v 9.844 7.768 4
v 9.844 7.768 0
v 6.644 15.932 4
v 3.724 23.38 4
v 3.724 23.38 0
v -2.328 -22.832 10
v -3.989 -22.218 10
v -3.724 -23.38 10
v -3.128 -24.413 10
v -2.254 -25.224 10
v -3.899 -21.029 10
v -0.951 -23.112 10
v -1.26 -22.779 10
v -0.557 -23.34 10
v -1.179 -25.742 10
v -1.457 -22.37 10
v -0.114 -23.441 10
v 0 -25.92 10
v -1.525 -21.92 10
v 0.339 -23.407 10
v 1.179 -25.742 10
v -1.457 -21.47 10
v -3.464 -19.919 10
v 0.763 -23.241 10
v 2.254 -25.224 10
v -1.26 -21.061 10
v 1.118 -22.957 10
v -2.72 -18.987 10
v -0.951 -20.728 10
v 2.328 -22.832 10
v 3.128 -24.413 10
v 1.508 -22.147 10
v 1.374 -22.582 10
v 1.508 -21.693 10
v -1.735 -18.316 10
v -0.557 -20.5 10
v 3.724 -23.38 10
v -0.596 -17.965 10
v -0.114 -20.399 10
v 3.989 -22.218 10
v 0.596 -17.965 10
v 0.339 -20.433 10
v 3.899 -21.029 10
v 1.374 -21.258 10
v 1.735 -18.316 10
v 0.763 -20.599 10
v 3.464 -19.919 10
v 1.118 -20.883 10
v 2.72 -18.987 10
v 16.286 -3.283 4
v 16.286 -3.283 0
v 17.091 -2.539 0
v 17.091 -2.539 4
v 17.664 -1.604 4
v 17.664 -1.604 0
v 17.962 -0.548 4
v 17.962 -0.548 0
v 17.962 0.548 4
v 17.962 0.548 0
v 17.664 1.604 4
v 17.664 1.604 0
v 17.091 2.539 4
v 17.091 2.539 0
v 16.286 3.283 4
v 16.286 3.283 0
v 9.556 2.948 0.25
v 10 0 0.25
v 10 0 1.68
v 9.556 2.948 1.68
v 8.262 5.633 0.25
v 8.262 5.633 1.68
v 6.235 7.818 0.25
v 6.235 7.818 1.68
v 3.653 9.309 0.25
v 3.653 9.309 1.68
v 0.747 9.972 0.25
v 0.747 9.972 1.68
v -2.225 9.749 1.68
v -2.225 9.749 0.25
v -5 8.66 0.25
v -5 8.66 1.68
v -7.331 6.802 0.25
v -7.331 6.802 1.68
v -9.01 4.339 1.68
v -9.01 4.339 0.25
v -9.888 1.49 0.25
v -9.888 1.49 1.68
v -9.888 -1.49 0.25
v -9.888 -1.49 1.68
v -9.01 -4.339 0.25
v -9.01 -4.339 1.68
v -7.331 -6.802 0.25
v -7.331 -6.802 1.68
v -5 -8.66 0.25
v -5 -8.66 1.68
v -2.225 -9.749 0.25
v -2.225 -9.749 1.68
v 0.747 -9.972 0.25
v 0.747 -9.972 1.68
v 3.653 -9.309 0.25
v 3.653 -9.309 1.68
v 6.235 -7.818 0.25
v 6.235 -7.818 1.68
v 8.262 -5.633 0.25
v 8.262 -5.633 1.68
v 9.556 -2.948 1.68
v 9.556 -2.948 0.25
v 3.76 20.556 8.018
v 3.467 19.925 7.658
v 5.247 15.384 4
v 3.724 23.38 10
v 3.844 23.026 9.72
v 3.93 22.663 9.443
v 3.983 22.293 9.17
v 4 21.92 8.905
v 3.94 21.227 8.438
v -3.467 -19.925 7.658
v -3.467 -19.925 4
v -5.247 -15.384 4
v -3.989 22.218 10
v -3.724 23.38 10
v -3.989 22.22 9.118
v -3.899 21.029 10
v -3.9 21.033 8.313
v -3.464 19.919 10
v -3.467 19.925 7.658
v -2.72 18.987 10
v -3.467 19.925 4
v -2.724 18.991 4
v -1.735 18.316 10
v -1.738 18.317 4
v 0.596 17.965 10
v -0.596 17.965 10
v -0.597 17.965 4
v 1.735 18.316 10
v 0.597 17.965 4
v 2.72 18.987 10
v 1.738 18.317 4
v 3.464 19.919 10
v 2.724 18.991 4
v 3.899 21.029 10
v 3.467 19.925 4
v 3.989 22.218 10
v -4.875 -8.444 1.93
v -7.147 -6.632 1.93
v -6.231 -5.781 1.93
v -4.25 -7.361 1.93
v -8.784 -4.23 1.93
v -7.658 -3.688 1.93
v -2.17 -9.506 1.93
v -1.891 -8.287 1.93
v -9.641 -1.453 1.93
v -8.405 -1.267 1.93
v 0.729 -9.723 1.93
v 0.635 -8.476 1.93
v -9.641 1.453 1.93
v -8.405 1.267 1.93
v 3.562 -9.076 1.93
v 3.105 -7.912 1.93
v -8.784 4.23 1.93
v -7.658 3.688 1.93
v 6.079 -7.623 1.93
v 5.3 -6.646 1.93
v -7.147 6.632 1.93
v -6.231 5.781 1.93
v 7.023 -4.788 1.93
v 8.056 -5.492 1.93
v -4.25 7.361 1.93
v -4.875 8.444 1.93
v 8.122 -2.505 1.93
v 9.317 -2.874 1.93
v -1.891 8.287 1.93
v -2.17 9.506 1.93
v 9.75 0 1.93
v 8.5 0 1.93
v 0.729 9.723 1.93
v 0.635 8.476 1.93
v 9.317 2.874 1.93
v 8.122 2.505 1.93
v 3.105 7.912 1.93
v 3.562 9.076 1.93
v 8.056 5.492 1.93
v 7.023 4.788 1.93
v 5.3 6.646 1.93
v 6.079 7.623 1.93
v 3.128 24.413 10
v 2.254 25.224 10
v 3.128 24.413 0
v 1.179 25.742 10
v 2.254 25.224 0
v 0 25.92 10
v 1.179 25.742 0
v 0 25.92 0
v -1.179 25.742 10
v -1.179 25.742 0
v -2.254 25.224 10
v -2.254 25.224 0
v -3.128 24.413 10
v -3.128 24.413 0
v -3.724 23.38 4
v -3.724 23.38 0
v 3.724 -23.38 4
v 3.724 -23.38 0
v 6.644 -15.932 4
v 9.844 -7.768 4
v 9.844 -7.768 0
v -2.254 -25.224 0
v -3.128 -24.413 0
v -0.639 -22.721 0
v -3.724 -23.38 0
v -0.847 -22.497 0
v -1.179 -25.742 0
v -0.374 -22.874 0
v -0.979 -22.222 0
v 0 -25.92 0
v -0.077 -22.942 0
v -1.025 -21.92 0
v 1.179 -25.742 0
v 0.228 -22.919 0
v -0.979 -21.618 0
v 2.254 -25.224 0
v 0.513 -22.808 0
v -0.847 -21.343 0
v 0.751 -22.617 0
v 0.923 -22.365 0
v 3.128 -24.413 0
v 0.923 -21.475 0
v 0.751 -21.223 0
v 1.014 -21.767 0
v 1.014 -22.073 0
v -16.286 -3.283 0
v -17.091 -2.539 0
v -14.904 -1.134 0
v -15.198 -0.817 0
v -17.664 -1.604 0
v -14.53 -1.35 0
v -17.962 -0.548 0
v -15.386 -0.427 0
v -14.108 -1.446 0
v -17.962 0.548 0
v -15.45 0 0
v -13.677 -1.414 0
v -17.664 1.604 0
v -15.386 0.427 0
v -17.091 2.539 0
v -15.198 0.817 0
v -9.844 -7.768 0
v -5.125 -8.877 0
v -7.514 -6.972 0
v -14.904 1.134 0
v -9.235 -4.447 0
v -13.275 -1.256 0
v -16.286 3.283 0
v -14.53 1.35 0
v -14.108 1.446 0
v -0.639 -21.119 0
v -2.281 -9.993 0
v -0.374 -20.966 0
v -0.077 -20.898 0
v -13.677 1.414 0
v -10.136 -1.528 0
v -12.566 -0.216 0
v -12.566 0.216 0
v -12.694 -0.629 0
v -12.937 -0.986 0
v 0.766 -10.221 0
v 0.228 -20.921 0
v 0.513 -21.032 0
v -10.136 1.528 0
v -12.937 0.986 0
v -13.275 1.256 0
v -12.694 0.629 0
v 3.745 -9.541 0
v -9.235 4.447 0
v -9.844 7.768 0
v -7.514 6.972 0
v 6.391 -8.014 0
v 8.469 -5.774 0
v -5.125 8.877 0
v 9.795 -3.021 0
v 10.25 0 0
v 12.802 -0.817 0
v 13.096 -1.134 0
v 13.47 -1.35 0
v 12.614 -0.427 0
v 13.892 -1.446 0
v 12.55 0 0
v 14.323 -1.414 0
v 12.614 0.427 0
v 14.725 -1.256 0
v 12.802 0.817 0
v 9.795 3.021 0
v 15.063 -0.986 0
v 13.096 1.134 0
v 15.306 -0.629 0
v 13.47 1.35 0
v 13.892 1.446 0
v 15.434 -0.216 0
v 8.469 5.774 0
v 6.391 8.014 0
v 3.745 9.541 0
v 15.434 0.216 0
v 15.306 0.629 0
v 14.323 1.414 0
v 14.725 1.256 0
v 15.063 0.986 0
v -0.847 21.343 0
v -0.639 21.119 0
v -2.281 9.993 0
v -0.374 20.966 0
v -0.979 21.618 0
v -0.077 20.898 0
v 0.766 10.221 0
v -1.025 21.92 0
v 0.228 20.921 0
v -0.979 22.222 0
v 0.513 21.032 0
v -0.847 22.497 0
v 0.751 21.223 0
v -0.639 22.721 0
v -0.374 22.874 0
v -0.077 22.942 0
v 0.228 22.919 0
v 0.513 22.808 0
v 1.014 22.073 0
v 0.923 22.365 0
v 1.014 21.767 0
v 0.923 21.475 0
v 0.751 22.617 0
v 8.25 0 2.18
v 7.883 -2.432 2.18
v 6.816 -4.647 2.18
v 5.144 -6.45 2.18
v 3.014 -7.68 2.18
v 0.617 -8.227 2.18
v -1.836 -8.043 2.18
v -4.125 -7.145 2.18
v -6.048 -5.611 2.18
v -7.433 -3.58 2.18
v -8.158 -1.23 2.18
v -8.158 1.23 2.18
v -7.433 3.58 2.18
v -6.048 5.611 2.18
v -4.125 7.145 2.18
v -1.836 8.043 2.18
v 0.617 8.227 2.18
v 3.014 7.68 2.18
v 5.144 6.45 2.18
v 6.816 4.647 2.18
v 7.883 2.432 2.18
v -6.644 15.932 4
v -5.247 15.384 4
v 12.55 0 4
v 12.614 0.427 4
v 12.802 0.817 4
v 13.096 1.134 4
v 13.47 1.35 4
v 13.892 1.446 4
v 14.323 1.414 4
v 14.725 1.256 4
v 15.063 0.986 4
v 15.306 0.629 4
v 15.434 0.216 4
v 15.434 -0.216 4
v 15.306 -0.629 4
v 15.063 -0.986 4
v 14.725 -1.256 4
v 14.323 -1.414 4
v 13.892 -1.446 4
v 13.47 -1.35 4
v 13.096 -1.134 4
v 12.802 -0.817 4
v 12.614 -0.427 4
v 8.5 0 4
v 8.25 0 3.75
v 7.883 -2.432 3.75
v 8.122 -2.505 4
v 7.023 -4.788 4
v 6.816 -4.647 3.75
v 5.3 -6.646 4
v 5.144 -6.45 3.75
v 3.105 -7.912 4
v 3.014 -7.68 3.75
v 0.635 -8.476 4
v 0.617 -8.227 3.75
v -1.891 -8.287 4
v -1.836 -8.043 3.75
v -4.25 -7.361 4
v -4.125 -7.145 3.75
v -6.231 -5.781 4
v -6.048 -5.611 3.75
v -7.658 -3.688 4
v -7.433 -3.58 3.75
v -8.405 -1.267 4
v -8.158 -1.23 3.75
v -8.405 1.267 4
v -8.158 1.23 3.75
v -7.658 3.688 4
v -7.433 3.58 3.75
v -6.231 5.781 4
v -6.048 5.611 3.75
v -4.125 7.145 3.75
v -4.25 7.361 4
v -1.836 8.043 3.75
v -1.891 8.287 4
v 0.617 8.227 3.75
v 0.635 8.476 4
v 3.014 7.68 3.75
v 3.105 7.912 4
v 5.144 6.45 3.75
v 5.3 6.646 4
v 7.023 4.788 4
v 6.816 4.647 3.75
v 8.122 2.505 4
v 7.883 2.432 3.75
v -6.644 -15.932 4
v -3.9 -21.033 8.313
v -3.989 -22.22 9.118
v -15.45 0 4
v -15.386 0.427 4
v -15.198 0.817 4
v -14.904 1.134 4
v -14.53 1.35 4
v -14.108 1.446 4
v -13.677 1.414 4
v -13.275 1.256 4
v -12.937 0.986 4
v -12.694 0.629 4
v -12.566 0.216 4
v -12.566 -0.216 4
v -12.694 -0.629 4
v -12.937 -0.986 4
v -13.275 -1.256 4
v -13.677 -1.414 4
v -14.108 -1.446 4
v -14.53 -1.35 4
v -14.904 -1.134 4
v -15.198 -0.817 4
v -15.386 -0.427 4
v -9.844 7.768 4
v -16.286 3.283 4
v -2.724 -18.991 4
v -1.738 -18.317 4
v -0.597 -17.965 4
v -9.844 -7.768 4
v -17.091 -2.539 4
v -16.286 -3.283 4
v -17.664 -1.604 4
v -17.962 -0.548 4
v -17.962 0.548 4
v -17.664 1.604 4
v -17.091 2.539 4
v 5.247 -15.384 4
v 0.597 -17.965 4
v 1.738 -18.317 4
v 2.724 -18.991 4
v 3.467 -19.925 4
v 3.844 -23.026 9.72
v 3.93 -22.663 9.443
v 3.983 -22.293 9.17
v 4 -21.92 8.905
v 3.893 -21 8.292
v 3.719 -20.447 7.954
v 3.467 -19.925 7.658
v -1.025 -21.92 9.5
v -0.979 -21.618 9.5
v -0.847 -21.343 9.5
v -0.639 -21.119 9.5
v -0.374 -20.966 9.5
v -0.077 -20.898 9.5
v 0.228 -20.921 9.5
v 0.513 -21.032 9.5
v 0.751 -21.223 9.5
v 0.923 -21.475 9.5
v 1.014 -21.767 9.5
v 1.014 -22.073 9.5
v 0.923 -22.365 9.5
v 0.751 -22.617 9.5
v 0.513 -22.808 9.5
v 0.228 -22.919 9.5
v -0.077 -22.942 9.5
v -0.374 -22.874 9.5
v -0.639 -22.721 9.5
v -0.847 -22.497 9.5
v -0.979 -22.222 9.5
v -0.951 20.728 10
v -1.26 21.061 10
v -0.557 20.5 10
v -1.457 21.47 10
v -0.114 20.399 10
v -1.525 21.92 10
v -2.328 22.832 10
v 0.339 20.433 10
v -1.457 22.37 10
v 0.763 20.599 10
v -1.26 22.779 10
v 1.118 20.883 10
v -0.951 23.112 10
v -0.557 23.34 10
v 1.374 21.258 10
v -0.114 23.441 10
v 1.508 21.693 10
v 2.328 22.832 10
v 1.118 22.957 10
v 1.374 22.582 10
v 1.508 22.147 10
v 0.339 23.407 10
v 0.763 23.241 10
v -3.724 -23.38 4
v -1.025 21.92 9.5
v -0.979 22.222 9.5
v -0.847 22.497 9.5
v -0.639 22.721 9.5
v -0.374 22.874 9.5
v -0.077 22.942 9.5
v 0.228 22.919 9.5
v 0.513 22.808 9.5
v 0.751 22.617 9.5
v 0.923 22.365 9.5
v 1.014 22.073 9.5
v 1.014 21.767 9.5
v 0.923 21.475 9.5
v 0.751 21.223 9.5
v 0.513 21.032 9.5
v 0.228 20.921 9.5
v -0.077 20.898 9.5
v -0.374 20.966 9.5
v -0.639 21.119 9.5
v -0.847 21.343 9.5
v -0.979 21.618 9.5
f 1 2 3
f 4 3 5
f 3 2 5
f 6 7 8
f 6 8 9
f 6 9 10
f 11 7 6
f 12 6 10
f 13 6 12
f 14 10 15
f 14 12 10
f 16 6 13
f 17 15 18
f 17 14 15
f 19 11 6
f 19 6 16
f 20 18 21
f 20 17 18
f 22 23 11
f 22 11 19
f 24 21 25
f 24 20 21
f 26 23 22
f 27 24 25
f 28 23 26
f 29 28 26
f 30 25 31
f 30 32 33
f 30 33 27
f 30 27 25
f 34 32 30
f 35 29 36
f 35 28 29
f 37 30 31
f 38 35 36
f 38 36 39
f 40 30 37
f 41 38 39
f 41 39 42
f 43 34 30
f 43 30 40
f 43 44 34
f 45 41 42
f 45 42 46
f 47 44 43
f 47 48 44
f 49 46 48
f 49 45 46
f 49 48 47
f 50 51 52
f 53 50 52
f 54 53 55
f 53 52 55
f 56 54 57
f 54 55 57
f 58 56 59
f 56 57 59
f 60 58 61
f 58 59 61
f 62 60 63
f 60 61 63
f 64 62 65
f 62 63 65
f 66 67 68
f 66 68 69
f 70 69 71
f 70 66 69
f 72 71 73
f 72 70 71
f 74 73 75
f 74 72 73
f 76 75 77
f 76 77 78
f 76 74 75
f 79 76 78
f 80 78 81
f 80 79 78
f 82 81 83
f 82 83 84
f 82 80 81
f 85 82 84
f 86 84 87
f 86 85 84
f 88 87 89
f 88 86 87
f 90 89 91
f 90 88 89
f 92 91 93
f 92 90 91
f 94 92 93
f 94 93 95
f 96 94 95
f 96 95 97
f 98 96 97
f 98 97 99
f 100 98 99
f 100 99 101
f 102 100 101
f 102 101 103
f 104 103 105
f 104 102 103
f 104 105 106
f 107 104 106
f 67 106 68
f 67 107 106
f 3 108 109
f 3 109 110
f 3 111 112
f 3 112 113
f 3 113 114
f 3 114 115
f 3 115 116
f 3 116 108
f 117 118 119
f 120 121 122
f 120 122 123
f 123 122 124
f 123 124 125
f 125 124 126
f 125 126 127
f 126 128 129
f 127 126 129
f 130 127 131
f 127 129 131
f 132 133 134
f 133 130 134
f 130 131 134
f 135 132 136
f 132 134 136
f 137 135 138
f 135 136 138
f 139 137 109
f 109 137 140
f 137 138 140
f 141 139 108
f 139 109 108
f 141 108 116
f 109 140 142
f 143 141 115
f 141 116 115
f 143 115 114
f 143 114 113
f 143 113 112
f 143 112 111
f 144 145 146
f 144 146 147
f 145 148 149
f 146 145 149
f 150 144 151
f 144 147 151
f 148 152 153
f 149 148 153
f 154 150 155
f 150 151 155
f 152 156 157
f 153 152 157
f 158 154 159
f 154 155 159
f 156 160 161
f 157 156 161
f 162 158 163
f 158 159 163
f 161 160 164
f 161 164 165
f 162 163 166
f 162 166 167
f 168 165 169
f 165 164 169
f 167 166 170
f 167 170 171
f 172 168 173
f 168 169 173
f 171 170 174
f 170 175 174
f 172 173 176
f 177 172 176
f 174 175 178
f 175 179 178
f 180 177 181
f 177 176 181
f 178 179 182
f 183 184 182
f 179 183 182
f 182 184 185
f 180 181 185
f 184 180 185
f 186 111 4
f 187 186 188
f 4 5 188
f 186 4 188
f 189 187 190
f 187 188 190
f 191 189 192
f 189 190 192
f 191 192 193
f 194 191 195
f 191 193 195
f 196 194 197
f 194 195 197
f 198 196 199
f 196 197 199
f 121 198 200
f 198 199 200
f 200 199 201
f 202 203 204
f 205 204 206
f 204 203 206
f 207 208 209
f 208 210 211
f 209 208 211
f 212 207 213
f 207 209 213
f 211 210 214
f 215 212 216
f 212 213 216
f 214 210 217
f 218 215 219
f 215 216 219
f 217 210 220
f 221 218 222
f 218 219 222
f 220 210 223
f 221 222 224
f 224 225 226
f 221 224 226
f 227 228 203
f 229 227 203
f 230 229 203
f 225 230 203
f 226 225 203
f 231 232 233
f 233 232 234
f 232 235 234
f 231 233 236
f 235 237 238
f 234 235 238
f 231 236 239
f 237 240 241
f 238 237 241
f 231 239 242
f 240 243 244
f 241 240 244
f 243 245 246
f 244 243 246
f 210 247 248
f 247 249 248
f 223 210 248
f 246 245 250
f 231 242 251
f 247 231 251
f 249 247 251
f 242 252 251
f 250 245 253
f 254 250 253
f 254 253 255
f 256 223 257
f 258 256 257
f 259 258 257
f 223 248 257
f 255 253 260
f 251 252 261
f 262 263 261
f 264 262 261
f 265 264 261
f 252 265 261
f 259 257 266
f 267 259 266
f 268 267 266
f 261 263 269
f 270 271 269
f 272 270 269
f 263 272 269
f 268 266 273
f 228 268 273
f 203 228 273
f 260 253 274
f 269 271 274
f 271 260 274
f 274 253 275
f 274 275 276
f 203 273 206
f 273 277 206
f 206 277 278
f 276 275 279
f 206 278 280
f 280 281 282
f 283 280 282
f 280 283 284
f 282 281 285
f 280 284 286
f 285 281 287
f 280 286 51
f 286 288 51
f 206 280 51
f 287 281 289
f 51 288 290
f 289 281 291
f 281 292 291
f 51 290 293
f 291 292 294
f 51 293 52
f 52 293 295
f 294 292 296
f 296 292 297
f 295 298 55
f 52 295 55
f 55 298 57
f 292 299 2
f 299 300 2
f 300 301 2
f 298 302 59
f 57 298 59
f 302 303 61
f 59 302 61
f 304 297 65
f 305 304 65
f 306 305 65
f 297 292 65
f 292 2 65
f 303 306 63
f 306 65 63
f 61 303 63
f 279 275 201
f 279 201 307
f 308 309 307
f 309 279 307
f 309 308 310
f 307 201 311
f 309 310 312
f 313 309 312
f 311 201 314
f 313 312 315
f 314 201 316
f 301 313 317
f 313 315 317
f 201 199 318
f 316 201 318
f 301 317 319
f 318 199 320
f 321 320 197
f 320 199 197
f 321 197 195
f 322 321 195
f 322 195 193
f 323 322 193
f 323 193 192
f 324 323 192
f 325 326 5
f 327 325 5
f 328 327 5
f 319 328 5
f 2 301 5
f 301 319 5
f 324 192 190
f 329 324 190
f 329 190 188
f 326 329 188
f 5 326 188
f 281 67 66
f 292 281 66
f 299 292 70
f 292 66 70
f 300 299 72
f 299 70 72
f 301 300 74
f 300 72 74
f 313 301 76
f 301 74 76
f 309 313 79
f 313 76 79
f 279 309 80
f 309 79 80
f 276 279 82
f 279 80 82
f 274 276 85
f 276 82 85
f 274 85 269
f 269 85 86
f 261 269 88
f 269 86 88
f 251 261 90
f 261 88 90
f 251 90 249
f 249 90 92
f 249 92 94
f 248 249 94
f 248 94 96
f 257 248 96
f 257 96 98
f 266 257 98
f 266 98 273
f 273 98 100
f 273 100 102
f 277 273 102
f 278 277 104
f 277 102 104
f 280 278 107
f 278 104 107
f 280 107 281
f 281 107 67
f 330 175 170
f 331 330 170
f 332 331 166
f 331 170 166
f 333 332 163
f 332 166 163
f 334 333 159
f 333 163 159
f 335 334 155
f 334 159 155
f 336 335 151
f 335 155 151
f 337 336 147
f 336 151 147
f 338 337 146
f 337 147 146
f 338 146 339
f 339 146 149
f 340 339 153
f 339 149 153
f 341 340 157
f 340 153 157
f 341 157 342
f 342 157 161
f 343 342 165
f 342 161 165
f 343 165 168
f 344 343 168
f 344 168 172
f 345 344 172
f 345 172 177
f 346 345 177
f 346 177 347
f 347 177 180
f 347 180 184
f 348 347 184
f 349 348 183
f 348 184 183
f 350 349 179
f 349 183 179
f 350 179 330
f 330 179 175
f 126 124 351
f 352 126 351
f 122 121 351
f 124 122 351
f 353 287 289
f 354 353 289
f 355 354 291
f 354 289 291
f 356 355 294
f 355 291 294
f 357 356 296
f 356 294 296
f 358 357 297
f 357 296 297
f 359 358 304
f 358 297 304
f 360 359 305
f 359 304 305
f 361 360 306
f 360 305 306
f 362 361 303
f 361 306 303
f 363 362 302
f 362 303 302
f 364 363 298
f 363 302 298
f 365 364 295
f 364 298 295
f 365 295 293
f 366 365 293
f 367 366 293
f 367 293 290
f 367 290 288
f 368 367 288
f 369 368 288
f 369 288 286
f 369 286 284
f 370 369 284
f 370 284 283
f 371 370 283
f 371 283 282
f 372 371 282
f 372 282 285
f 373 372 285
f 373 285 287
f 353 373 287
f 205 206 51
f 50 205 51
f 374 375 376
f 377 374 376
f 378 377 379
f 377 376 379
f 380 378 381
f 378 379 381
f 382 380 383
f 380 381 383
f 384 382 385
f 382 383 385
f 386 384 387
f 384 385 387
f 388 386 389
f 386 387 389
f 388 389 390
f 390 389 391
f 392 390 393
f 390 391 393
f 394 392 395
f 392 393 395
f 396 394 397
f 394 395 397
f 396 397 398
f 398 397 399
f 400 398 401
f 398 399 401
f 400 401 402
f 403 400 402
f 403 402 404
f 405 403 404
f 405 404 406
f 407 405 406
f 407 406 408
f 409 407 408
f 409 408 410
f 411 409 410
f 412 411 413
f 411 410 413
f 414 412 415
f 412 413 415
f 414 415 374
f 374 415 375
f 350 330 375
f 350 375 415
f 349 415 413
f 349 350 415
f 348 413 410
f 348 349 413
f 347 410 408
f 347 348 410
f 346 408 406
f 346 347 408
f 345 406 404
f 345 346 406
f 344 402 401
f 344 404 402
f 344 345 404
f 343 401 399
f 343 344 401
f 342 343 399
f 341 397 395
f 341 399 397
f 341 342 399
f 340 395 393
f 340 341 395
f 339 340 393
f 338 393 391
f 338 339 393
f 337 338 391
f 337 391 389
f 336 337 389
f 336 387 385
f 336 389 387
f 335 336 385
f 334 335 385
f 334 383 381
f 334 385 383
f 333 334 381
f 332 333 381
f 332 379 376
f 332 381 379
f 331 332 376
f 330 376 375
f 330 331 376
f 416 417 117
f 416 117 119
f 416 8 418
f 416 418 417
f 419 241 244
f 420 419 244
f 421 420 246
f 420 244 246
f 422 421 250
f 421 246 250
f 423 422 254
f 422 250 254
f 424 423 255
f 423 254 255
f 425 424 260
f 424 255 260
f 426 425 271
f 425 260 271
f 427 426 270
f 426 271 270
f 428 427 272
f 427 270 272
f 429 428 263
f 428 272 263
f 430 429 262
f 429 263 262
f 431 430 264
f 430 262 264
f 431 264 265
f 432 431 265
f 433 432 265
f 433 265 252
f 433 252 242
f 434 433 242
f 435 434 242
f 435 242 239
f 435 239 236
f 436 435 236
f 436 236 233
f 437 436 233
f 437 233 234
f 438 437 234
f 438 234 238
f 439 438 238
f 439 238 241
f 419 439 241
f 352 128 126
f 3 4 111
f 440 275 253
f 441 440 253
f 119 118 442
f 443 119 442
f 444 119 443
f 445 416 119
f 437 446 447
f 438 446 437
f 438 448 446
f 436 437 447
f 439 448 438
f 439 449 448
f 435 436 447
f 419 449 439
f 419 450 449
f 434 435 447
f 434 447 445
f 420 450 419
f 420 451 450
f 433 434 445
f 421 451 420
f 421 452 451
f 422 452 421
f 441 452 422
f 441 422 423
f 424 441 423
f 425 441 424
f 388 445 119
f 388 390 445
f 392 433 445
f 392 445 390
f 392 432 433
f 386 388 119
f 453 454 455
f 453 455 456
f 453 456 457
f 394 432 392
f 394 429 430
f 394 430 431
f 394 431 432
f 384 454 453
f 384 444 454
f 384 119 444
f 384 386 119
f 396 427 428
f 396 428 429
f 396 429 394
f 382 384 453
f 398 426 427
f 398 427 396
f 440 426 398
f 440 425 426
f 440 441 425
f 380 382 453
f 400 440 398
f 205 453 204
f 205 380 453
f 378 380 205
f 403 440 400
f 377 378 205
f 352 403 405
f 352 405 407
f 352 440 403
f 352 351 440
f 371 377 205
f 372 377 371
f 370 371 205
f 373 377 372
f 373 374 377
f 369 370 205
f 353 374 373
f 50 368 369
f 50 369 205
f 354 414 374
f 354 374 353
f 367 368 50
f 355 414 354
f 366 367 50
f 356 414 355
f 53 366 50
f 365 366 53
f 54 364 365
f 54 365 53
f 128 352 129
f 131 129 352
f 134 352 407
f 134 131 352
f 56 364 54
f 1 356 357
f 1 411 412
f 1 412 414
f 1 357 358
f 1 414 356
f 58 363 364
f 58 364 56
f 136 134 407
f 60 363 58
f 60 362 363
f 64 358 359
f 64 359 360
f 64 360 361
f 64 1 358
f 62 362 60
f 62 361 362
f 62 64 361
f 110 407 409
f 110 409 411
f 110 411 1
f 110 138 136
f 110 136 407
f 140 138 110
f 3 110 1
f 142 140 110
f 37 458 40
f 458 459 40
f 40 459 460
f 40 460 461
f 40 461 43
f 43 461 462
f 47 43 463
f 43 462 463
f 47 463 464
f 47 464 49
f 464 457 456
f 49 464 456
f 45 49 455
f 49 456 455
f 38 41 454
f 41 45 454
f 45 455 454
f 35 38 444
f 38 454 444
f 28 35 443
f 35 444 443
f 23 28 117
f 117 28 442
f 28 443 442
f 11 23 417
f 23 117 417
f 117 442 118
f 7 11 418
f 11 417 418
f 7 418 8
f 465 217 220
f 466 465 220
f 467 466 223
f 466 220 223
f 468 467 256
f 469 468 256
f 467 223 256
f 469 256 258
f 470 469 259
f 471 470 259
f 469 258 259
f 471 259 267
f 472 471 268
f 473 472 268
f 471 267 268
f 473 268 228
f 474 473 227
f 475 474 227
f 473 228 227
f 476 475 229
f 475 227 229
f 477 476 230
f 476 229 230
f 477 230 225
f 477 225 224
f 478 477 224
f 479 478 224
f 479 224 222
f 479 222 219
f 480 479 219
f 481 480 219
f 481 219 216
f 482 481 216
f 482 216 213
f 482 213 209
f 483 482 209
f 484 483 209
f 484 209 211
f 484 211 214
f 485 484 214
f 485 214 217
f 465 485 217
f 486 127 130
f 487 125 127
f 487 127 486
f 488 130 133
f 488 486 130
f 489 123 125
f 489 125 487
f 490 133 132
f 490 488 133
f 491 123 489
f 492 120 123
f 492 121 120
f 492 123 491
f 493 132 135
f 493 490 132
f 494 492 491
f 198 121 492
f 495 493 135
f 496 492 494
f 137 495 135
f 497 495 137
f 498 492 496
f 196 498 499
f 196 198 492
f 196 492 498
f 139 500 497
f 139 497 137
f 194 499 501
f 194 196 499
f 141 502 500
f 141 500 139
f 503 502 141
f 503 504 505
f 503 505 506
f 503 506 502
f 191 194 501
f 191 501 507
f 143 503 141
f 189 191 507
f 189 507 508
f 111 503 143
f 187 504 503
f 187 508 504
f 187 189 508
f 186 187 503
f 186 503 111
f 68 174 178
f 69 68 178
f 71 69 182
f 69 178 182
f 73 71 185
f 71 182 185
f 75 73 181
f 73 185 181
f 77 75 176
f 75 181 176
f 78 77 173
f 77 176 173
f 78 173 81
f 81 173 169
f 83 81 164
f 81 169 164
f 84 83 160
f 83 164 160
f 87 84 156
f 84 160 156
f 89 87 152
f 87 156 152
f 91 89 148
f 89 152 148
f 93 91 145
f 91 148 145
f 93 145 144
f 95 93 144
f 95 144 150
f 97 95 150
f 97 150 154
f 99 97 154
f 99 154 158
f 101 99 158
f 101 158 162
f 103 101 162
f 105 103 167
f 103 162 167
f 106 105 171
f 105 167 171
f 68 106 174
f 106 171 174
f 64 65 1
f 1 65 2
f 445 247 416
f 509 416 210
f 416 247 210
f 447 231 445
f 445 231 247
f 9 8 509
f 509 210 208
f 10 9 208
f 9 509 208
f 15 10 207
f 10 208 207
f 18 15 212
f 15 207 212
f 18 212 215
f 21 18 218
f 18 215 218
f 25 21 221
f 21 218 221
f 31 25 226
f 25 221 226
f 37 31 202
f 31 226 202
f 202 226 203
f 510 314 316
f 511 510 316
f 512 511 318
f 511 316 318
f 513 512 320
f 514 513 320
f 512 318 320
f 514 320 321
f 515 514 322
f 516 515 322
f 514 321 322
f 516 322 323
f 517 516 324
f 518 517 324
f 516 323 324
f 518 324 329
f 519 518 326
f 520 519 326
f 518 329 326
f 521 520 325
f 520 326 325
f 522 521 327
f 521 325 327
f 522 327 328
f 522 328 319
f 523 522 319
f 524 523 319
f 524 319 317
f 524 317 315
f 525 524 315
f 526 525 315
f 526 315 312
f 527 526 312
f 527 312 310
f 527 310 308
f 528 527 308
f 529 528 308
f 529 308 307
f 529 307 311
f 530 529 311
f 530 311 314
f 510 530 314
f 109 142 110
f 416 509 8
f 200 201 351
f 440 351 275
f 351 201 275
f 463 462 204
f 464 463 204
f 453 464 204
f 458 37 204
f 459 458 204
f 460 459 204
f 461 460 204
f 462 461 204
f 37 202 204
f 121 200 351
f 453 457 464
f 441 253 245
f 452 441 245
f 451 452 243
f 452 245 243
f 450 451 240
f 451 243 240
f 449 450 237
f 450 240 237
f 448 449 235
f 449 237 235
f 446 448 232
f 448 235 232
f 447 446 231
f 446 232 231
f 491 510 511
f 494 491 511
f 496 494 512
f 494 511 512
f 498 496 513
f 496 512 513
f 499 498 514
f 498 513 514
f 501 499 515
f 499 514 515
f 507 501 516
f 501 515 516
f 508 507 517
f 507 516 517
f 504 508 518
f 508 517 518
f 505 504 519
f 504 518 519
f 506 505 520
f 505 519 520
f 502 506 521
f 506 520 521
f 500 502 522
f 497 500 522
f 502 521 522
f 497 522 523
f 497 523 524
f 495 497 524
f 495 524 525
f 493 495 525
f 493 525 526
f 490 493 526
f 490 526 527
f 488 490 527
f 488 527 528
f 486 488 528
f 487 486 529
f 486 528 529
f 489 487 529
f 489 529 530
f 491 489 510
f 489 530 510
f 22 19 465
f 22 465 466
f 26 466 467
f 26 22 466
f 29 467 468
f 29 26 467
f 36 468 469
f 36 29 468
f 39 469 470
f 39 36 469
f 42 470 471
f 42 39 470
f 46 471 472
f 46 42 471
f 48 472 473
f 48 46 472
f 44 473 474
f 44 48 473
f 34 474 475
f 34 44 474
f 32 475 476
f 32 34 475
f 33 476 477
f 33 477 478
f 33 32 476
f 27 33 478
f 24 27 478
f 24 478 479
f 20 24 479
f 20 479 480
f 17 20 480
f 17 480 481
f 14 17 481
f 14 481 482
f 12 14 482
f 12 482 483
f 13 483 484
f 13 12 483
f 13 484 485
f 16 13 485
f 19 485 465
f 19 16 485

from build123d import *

# Parameters (mm, degrees)
BOSS_EXTRUDE1_DEPTH            = 4
CUT_EXTRUDE1_DEPTH             = 5
CUT_EXTRUDE1_DEPTH_BACK        = 1
SKETCH1_6_R                    = 10
CUT_EXTRUDE2_DEPTH             = 1.93
CUT_EXTRUDE2_DEPTH_BACK        = 1
M2_5_CLEARANCE_HOLE1_D         = 2.9
CHAMFER1_SIZE                  = 0.25
BOSS_EXTRUDE5_DEPTH            = 4
SKETCH4_5_R                    = 4
BOSS_EXTRUDE6_DEPTH            = 10
TAP_DRILL_FOR_M2_5X0_45_TAP2_D = 2.05
BOSS_EXTRUDE7_DEPTH            = 1.5
MIRROR4_COPY_1_DEPTH           = 1.5
CHAMFER3_SIZE                  = 0.5


with BuildPart() as part:
    # Sketch1 → Boss-Extrude1 (new body)
    with BuildSketch(Plane.XY):
        with BuildLine():
            ThreePointArc((16.285714286, -3.282607227), (18, 0), (16.285714286, 3.282607227))
            Line((16.285714286, 3.282607227), (6.857142857, 9.84782168))
            ThreePointArc((6.857142857, 9.84782168), (0, 12), (-6.857142857, 9.84782168))
            Line((-6.857142857, 9.84782168), (-16.285714286, 3.282607227))
            ThreePointArc((-16.285714286, 3.282607227), (-18, 0), (-16.285714286, -3.282607227))
            Line((-16.285714286, -3.282607227), (-6.857142857, -9.84782168))
            ThreePointArc((-6.857142857, -9.84782168), (0, -12), (6.857142857, -9.84782168))
            Line((6.857142857, -9.84782168), (16.285714286, -3.282607227))
        make_face()
    extrude(amount=BOSS_EXTRUDE1_DEPTH)

    # Sketch1_4 → Cut-Extrude1 (cut, two sides)
    with BuildSketch(Plane.XY) as cut_extrude1_sk:
        with BuildLine():
            ThreePointArc((-8.25, 0), (0, -8.25), (8.25, 0))
            Line((8.25, 0), (-8.25, 0))
        make_face()
        with BuildLine():
            Line((-8.25, 0), (8.25, 0))
            ThreePointArc((8.25, 0), (0, 8.25), (-8.25, 0))
        make_face()
    extrude(amount=CUT_EXTRUDE1_DEPTH, mode=Mode.SUBTRACT)
    extrude(cut_extrude1_sk.sketch, amount=-CUT_EXTRUDE1_DEPTH_BACK, mode=Mode.SUBTRACT)

    # Sketch1_6 → Cut-Extrude2 (cut, two sides)
    with BuildSketch(Plane.XY) as cut_extrude2_sk:
        Circle(SKETCH1_6_R)
    extrude(amount=CUT_EXTRUDE2_DEPTH, mode=Mode.SUBTRACT)
    extrude(cut_extrude2_sk.sketch, amount=-CUT_EXTRUDE2_DEPTH_BACK, mode=Mode.SUBTRACT)

    # M2.5 Clearance Hole1 (through all)
    with Locations(Plane.XY.offset(4)):
        with Locations((-14, 0), (14, 0)):
            Hole(M2_5_CLEARANCE_HOLE1_D / 2)

    # Chamfer1
    chamfer1_edges = [part.edges().sort_by_distance(p)[0] for p in [
        (-8.25, 0, 4),
        (-10, 0, 0),
        (-10, 0, 1.93),
        (-8.25, 0, 1.93),
    ]]
    chamfer(chamfer1_edges, length=CHAMFER1_SIZE)

    # Sketch4_4 → Boss-Extrude5 (add)
    with BuildSketch(Plane.XY):
        with BuildLine():
            Line((11.172261915, 4.379562044), (3.724087305, 23.379854015))
            ThreePointArc((3.724087305, 23.379854015), (0, 25.92), (-3.724087305, 23.379854015))
            Line((-3.724087305, 23.379854015), (-11.172261915, 4.379562044))
            ThreePointArc((-11.172261915, 4.379562044), (0, 12), (11.172261915, 4.379562044))
        make_face()
        with BuildLine():
            ThreePointArc((11.172261915, -4.379562044), (0, -12), (-11.172261915, -4.379562044))
            Line((-11.172261915, -4.379562044), (-3.724087305, -23.379854015))
            ThreePointArc((-3.724087305, -23.379854015), (0, -25.92), (3.724087305, -23.379854015))
            Line((3.724087305, -23.379854015), (11.172261915, -4.379562044))
        make_face()
    extrude(amount=BOSS_EXTRUDE5_DEPTH)

    # Sketch4_5 → Boss-Extrude6 (add)
    with BuildSketch(Plane.XY):
        with Locations((0, 21.92)):
            Circle(SKETCH4_5_R)
        with Locations((0, -21.92)):
            Circle(SKETCH4_5_R)
    extrude(amount=BOSS_EXTRUDE6_DEPTH)

    # Tap Drill for M2.5x0.45 Tap2 (through all)
    with Locations(Plane.XY.offset(10)):
        with Locations((0, 21.92), (0, -21.92)):
            Hole(TAP_DRILL_FOR_M2_5X0_45_TAP2_D / 2)

    # Sketch10 → Boss-Extrude7 (add)
    with BuildSketch(Plane(origin=(-11.172261915, -4.379562044, 0), x_dir=(0, 0, 1), z_dir=(-0.931021826, -0.364963504, 0))):
        Polygon((10, -20.407998432), (4, -12.407998432), (4, -20.407998432), align=None)
    boss_extrude7 = extrude(amount=-BOSS_EXTRUDE7_DEPTH)

    # Mirror3: Boss-Extrude7 across plane
    add(boss_extrude7.mirror(Plane(origin=(0, 0, 0), x_dir=(0, 0, 1), z_dir=(1, 0, 0))))

    # Mirror4: Boss-Extrude7 across plane
    add(boss_extrude7.mirror(Plane.ZX))

    # Mirror4 copy 1 sketch → Mirror4 copy 1 (add)
    with BuildSketch(Plane(origin=(11.172261915, 4.379562044, 0), x_dir=(0, 0, 1), z_dir=(0.931021826, 0.364963504, 0))):
        Polygon((10, -20.407998432), (4, -12.407998432), (4, -20.407998432), align=None)
    extrude(amount=-MIRROR4_COPY_1_DEPTH)

    # Chamfer3
    chamfer3_edges = [part.edges().sort_by_distance(p)[0] for p in [
        (1.025, -21.92, 10),
        (1.025, 21.92, 10),
    ]]
    chamfer(chamfer3_edges, length=CHAMFER3_SIZE)


solid = part.part
